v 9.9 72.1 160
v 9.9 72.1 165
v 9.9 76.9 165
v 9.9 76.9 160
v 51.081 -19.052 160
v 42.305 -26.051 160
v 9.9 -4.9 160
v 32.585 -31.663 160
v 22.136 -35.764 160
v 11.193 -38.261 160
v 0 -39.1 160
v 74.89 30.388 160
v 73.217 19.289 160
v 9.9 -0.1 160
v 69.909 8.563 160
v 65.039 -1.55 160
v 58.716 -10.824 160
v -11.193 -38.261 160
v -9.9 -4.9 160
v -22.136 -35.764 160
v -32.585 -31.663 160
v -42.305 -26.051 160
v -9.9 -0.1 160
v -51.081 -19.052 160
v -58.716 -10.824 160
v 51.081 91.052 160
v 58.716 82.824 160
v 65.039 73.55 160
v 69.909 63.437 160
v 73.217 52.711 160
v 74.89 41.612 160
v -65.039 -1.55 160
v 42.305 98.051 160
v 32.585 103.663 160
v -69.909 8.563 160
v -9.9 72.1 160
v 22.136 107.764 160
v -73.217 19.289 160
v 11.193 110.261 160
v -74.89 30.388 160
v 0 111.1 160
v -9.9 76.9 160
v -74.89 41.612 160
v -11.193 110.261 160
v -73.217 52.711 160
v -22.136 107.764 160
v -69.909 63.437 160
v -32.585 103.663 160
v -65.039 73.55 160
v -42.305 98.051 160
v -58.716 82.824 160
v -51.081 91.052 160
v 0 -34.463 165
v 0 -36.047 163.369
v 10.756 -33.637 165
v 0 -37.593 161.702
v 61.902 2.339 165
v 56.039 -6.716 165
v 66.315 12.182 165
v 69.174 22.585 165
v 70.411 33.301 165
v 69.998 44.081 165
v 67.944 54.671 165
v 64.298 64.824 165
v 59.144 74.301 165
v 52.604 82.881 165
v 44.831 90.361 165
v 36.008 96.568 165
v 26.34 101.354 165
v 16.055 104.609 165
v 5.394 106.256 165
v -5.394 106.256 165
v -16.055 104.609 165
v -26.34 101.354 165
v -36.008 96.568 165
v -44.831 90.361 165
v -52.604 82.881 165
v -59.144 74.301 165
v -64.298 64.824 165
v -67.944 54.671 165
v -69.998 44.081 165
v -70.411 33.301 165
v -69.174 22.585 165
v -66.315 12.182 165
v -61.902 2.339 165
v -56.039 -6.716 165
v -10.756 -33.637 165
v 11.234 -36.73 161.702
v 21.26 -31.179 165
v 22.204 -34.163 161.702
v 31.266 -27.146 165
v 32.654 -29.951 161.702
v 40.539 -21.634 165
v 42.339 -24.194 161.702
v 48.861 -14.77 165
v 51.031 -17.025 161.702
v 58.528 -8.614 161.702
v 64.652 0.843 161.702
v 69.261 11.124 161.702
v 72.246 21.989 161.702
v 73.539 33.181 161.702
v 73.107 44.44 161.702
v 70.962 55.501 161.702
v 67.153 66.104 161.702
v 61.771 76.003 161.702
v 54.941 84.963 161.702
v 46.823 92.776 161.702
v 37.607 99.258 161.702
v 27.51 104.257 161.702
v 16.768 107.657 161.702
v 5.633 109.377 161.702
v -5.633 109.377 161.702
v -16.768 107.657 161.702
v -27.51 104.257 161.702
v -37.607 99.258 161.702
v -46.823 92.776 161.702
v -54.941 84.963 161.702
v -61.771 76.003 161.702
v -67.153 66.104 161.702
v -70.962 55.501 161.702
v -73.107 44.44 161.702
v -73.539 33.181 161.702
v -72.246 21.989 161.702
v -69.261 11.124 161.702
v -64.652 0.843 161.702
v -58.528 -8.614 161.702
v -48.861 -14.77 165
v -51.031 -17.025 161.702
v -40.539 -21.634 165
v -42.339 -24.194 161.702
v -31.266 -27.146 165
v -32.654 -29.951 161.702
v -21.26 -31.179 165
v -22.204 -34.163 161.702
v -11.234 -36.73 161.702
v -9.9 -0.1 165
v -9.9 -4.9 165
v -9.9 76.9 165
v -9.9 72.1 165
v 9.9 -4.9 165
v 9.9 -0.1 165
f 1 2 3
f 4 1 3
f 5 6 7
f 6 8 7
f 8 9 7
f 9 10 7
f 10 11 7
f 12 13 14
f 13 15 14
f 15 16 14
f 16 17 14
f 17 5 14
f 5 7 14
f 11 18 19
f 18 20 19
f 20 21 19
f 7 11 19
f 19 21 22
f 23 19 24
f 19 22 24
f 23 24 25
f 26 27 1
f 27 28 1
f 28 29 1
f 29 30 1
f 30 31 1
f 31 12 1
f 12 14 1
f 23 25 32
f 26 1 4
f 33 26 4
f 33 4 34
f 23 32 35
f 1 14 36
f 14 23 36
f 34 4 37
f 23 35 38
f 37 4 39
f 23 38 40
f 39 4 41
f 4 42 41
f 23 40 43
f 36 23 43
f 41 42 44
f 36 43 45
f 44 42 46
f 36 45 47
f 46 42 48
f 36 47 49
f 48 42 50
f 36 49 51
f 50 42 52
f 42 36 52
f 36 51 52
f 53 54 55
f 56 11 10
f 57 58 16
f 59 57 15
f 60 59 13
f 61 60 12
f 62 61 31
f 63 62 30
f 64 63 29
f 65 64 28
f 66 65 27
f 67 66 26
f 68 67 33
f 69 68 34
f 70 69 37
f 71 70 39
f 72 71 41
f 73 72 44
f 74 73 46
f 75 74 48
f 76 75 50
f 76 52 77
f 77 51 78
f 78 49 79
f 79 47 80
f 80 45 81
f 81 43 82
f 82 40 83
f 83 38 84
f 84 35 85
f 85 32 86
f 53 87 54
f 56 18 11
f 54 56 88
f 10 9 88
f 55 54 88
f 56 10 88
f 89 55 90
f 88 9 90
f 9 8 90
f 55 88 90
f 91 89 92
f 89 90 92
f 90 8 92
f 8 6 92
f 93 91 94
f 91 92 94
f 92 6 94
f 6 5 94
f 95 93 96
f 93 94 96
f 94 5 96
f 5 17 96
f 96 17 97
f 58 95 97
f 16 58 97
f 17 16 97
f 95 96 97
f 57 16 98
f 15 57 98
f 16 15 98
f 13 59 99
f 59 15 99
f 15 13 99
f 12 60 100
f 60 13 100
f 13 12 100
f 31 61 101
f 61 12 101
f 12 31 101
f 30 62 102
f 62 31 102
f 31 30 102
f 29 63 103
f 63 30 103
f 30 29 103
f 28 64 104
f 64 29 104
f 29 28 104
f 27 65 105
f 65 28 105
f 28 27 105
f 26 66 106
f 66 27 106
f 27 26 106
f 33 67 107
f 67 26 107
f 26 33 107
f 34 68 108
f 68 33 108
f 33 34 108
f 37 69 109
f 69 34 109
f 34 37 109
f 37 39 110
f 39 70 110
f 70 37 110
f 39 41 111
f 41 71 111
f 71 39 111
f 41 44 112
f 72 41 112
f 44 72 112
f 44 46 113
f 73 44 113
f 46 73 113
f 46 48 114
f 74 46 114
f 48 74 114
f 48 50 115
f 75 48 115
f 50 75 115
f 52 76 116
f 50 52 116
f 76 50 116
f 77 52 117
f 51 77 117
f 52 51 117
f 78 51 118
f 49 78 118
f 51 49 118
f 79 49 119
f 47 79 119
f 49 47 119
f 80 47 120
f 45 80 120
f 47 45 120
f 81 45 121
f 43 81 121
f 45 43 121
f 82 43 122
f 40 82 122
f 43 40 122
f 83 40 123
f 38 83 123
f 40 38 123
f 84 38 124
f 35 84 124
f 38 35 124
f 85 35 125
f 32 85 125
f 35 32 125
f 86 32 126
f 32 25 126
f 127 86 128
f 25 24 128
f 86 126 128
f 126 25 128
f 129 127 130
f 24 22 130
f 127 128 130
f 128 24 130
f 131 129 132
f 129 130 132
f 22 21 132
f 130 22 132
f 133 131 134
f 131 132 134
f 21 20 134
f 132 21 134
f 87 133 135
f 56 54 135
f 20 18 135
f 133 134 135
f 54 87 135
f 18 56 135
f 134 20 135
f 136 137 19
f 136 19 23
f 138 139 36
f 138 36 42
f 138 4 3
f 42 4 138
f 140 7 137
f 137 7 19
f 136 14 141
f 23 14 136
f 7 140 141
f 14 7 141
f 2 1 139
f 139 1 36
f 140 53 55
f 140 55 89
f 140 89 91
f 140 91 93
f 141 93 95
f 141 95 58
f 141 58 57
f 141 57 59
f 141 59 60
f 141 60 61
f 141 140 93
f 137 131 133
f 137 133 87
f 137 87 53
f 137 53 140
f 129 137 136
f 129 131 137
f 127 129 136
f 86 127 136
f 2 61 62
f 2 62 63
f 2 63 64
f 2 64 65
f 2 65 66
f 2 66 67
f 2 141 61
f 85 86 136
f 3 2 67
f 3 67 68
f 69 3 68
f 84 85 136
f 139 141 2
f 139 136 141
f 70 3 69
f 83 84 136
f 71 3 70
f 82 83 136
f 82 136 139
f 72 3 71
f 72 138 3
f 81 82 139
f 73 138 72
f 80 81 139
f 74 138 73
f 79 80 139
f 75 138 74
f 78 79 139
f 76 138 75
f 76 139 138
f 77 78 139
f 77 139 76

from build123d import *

# Parameters (mm, degrees)
SKETCH018_R         = 75.1
SKETCH018_W         = 4.8
SKETCH018_H         = 19.8
PAD018_DEPTH        = 5
CUT_PLACEMENT_ANGLE = 90


with BuildPart() as revolution:
    # Sketch019 → Revolution (revolve)
    with BuildSketch(Plane.XZ):
        with BuildLine():
            Line((-75.1, 0), (-75.1, 5))
            Line((-75.1, 5), (-70.462827, 5))
            ThreePointArc((-70.462827, 5), (-72.824338, 2.539809), (-75.1, 0))
        make_face()
    revolve(axis=Axis((0, 0, 0), (0, 0, 1)))


with BuildPart() as bowlsupport:
    # Sketch018 → Pad018 (new body)
    with BuildSketch(Plane.XY):
        Circle(SKETCH018_R)
        with Locations((-38.5, 0)):
            Rectangle(SKETCH018_W, SKETCH018_H, mode=Mode.SUBTRACT)
        with Locations((38.5, 0)):
            Rectangle(SKETCH018_W, SKETCH018_H, mode=Mode.SUBTRACT)
    extrude(amount=PAD018_DEPTH)

    # Cut: cut Revolution
    add(revolution.part, mode=Mode.SUBTRACT)


with BuildPart() as bowlsupport_1:
    # Cut placement: moved
    add(bowlsupport.part.moved(Location((0, 36, 160))).rotate(Axis((0, 36, 160), (0, 0, 1)), CUT_PLACEMENT_ANGLE))


solid = bowlsupport_1.part
